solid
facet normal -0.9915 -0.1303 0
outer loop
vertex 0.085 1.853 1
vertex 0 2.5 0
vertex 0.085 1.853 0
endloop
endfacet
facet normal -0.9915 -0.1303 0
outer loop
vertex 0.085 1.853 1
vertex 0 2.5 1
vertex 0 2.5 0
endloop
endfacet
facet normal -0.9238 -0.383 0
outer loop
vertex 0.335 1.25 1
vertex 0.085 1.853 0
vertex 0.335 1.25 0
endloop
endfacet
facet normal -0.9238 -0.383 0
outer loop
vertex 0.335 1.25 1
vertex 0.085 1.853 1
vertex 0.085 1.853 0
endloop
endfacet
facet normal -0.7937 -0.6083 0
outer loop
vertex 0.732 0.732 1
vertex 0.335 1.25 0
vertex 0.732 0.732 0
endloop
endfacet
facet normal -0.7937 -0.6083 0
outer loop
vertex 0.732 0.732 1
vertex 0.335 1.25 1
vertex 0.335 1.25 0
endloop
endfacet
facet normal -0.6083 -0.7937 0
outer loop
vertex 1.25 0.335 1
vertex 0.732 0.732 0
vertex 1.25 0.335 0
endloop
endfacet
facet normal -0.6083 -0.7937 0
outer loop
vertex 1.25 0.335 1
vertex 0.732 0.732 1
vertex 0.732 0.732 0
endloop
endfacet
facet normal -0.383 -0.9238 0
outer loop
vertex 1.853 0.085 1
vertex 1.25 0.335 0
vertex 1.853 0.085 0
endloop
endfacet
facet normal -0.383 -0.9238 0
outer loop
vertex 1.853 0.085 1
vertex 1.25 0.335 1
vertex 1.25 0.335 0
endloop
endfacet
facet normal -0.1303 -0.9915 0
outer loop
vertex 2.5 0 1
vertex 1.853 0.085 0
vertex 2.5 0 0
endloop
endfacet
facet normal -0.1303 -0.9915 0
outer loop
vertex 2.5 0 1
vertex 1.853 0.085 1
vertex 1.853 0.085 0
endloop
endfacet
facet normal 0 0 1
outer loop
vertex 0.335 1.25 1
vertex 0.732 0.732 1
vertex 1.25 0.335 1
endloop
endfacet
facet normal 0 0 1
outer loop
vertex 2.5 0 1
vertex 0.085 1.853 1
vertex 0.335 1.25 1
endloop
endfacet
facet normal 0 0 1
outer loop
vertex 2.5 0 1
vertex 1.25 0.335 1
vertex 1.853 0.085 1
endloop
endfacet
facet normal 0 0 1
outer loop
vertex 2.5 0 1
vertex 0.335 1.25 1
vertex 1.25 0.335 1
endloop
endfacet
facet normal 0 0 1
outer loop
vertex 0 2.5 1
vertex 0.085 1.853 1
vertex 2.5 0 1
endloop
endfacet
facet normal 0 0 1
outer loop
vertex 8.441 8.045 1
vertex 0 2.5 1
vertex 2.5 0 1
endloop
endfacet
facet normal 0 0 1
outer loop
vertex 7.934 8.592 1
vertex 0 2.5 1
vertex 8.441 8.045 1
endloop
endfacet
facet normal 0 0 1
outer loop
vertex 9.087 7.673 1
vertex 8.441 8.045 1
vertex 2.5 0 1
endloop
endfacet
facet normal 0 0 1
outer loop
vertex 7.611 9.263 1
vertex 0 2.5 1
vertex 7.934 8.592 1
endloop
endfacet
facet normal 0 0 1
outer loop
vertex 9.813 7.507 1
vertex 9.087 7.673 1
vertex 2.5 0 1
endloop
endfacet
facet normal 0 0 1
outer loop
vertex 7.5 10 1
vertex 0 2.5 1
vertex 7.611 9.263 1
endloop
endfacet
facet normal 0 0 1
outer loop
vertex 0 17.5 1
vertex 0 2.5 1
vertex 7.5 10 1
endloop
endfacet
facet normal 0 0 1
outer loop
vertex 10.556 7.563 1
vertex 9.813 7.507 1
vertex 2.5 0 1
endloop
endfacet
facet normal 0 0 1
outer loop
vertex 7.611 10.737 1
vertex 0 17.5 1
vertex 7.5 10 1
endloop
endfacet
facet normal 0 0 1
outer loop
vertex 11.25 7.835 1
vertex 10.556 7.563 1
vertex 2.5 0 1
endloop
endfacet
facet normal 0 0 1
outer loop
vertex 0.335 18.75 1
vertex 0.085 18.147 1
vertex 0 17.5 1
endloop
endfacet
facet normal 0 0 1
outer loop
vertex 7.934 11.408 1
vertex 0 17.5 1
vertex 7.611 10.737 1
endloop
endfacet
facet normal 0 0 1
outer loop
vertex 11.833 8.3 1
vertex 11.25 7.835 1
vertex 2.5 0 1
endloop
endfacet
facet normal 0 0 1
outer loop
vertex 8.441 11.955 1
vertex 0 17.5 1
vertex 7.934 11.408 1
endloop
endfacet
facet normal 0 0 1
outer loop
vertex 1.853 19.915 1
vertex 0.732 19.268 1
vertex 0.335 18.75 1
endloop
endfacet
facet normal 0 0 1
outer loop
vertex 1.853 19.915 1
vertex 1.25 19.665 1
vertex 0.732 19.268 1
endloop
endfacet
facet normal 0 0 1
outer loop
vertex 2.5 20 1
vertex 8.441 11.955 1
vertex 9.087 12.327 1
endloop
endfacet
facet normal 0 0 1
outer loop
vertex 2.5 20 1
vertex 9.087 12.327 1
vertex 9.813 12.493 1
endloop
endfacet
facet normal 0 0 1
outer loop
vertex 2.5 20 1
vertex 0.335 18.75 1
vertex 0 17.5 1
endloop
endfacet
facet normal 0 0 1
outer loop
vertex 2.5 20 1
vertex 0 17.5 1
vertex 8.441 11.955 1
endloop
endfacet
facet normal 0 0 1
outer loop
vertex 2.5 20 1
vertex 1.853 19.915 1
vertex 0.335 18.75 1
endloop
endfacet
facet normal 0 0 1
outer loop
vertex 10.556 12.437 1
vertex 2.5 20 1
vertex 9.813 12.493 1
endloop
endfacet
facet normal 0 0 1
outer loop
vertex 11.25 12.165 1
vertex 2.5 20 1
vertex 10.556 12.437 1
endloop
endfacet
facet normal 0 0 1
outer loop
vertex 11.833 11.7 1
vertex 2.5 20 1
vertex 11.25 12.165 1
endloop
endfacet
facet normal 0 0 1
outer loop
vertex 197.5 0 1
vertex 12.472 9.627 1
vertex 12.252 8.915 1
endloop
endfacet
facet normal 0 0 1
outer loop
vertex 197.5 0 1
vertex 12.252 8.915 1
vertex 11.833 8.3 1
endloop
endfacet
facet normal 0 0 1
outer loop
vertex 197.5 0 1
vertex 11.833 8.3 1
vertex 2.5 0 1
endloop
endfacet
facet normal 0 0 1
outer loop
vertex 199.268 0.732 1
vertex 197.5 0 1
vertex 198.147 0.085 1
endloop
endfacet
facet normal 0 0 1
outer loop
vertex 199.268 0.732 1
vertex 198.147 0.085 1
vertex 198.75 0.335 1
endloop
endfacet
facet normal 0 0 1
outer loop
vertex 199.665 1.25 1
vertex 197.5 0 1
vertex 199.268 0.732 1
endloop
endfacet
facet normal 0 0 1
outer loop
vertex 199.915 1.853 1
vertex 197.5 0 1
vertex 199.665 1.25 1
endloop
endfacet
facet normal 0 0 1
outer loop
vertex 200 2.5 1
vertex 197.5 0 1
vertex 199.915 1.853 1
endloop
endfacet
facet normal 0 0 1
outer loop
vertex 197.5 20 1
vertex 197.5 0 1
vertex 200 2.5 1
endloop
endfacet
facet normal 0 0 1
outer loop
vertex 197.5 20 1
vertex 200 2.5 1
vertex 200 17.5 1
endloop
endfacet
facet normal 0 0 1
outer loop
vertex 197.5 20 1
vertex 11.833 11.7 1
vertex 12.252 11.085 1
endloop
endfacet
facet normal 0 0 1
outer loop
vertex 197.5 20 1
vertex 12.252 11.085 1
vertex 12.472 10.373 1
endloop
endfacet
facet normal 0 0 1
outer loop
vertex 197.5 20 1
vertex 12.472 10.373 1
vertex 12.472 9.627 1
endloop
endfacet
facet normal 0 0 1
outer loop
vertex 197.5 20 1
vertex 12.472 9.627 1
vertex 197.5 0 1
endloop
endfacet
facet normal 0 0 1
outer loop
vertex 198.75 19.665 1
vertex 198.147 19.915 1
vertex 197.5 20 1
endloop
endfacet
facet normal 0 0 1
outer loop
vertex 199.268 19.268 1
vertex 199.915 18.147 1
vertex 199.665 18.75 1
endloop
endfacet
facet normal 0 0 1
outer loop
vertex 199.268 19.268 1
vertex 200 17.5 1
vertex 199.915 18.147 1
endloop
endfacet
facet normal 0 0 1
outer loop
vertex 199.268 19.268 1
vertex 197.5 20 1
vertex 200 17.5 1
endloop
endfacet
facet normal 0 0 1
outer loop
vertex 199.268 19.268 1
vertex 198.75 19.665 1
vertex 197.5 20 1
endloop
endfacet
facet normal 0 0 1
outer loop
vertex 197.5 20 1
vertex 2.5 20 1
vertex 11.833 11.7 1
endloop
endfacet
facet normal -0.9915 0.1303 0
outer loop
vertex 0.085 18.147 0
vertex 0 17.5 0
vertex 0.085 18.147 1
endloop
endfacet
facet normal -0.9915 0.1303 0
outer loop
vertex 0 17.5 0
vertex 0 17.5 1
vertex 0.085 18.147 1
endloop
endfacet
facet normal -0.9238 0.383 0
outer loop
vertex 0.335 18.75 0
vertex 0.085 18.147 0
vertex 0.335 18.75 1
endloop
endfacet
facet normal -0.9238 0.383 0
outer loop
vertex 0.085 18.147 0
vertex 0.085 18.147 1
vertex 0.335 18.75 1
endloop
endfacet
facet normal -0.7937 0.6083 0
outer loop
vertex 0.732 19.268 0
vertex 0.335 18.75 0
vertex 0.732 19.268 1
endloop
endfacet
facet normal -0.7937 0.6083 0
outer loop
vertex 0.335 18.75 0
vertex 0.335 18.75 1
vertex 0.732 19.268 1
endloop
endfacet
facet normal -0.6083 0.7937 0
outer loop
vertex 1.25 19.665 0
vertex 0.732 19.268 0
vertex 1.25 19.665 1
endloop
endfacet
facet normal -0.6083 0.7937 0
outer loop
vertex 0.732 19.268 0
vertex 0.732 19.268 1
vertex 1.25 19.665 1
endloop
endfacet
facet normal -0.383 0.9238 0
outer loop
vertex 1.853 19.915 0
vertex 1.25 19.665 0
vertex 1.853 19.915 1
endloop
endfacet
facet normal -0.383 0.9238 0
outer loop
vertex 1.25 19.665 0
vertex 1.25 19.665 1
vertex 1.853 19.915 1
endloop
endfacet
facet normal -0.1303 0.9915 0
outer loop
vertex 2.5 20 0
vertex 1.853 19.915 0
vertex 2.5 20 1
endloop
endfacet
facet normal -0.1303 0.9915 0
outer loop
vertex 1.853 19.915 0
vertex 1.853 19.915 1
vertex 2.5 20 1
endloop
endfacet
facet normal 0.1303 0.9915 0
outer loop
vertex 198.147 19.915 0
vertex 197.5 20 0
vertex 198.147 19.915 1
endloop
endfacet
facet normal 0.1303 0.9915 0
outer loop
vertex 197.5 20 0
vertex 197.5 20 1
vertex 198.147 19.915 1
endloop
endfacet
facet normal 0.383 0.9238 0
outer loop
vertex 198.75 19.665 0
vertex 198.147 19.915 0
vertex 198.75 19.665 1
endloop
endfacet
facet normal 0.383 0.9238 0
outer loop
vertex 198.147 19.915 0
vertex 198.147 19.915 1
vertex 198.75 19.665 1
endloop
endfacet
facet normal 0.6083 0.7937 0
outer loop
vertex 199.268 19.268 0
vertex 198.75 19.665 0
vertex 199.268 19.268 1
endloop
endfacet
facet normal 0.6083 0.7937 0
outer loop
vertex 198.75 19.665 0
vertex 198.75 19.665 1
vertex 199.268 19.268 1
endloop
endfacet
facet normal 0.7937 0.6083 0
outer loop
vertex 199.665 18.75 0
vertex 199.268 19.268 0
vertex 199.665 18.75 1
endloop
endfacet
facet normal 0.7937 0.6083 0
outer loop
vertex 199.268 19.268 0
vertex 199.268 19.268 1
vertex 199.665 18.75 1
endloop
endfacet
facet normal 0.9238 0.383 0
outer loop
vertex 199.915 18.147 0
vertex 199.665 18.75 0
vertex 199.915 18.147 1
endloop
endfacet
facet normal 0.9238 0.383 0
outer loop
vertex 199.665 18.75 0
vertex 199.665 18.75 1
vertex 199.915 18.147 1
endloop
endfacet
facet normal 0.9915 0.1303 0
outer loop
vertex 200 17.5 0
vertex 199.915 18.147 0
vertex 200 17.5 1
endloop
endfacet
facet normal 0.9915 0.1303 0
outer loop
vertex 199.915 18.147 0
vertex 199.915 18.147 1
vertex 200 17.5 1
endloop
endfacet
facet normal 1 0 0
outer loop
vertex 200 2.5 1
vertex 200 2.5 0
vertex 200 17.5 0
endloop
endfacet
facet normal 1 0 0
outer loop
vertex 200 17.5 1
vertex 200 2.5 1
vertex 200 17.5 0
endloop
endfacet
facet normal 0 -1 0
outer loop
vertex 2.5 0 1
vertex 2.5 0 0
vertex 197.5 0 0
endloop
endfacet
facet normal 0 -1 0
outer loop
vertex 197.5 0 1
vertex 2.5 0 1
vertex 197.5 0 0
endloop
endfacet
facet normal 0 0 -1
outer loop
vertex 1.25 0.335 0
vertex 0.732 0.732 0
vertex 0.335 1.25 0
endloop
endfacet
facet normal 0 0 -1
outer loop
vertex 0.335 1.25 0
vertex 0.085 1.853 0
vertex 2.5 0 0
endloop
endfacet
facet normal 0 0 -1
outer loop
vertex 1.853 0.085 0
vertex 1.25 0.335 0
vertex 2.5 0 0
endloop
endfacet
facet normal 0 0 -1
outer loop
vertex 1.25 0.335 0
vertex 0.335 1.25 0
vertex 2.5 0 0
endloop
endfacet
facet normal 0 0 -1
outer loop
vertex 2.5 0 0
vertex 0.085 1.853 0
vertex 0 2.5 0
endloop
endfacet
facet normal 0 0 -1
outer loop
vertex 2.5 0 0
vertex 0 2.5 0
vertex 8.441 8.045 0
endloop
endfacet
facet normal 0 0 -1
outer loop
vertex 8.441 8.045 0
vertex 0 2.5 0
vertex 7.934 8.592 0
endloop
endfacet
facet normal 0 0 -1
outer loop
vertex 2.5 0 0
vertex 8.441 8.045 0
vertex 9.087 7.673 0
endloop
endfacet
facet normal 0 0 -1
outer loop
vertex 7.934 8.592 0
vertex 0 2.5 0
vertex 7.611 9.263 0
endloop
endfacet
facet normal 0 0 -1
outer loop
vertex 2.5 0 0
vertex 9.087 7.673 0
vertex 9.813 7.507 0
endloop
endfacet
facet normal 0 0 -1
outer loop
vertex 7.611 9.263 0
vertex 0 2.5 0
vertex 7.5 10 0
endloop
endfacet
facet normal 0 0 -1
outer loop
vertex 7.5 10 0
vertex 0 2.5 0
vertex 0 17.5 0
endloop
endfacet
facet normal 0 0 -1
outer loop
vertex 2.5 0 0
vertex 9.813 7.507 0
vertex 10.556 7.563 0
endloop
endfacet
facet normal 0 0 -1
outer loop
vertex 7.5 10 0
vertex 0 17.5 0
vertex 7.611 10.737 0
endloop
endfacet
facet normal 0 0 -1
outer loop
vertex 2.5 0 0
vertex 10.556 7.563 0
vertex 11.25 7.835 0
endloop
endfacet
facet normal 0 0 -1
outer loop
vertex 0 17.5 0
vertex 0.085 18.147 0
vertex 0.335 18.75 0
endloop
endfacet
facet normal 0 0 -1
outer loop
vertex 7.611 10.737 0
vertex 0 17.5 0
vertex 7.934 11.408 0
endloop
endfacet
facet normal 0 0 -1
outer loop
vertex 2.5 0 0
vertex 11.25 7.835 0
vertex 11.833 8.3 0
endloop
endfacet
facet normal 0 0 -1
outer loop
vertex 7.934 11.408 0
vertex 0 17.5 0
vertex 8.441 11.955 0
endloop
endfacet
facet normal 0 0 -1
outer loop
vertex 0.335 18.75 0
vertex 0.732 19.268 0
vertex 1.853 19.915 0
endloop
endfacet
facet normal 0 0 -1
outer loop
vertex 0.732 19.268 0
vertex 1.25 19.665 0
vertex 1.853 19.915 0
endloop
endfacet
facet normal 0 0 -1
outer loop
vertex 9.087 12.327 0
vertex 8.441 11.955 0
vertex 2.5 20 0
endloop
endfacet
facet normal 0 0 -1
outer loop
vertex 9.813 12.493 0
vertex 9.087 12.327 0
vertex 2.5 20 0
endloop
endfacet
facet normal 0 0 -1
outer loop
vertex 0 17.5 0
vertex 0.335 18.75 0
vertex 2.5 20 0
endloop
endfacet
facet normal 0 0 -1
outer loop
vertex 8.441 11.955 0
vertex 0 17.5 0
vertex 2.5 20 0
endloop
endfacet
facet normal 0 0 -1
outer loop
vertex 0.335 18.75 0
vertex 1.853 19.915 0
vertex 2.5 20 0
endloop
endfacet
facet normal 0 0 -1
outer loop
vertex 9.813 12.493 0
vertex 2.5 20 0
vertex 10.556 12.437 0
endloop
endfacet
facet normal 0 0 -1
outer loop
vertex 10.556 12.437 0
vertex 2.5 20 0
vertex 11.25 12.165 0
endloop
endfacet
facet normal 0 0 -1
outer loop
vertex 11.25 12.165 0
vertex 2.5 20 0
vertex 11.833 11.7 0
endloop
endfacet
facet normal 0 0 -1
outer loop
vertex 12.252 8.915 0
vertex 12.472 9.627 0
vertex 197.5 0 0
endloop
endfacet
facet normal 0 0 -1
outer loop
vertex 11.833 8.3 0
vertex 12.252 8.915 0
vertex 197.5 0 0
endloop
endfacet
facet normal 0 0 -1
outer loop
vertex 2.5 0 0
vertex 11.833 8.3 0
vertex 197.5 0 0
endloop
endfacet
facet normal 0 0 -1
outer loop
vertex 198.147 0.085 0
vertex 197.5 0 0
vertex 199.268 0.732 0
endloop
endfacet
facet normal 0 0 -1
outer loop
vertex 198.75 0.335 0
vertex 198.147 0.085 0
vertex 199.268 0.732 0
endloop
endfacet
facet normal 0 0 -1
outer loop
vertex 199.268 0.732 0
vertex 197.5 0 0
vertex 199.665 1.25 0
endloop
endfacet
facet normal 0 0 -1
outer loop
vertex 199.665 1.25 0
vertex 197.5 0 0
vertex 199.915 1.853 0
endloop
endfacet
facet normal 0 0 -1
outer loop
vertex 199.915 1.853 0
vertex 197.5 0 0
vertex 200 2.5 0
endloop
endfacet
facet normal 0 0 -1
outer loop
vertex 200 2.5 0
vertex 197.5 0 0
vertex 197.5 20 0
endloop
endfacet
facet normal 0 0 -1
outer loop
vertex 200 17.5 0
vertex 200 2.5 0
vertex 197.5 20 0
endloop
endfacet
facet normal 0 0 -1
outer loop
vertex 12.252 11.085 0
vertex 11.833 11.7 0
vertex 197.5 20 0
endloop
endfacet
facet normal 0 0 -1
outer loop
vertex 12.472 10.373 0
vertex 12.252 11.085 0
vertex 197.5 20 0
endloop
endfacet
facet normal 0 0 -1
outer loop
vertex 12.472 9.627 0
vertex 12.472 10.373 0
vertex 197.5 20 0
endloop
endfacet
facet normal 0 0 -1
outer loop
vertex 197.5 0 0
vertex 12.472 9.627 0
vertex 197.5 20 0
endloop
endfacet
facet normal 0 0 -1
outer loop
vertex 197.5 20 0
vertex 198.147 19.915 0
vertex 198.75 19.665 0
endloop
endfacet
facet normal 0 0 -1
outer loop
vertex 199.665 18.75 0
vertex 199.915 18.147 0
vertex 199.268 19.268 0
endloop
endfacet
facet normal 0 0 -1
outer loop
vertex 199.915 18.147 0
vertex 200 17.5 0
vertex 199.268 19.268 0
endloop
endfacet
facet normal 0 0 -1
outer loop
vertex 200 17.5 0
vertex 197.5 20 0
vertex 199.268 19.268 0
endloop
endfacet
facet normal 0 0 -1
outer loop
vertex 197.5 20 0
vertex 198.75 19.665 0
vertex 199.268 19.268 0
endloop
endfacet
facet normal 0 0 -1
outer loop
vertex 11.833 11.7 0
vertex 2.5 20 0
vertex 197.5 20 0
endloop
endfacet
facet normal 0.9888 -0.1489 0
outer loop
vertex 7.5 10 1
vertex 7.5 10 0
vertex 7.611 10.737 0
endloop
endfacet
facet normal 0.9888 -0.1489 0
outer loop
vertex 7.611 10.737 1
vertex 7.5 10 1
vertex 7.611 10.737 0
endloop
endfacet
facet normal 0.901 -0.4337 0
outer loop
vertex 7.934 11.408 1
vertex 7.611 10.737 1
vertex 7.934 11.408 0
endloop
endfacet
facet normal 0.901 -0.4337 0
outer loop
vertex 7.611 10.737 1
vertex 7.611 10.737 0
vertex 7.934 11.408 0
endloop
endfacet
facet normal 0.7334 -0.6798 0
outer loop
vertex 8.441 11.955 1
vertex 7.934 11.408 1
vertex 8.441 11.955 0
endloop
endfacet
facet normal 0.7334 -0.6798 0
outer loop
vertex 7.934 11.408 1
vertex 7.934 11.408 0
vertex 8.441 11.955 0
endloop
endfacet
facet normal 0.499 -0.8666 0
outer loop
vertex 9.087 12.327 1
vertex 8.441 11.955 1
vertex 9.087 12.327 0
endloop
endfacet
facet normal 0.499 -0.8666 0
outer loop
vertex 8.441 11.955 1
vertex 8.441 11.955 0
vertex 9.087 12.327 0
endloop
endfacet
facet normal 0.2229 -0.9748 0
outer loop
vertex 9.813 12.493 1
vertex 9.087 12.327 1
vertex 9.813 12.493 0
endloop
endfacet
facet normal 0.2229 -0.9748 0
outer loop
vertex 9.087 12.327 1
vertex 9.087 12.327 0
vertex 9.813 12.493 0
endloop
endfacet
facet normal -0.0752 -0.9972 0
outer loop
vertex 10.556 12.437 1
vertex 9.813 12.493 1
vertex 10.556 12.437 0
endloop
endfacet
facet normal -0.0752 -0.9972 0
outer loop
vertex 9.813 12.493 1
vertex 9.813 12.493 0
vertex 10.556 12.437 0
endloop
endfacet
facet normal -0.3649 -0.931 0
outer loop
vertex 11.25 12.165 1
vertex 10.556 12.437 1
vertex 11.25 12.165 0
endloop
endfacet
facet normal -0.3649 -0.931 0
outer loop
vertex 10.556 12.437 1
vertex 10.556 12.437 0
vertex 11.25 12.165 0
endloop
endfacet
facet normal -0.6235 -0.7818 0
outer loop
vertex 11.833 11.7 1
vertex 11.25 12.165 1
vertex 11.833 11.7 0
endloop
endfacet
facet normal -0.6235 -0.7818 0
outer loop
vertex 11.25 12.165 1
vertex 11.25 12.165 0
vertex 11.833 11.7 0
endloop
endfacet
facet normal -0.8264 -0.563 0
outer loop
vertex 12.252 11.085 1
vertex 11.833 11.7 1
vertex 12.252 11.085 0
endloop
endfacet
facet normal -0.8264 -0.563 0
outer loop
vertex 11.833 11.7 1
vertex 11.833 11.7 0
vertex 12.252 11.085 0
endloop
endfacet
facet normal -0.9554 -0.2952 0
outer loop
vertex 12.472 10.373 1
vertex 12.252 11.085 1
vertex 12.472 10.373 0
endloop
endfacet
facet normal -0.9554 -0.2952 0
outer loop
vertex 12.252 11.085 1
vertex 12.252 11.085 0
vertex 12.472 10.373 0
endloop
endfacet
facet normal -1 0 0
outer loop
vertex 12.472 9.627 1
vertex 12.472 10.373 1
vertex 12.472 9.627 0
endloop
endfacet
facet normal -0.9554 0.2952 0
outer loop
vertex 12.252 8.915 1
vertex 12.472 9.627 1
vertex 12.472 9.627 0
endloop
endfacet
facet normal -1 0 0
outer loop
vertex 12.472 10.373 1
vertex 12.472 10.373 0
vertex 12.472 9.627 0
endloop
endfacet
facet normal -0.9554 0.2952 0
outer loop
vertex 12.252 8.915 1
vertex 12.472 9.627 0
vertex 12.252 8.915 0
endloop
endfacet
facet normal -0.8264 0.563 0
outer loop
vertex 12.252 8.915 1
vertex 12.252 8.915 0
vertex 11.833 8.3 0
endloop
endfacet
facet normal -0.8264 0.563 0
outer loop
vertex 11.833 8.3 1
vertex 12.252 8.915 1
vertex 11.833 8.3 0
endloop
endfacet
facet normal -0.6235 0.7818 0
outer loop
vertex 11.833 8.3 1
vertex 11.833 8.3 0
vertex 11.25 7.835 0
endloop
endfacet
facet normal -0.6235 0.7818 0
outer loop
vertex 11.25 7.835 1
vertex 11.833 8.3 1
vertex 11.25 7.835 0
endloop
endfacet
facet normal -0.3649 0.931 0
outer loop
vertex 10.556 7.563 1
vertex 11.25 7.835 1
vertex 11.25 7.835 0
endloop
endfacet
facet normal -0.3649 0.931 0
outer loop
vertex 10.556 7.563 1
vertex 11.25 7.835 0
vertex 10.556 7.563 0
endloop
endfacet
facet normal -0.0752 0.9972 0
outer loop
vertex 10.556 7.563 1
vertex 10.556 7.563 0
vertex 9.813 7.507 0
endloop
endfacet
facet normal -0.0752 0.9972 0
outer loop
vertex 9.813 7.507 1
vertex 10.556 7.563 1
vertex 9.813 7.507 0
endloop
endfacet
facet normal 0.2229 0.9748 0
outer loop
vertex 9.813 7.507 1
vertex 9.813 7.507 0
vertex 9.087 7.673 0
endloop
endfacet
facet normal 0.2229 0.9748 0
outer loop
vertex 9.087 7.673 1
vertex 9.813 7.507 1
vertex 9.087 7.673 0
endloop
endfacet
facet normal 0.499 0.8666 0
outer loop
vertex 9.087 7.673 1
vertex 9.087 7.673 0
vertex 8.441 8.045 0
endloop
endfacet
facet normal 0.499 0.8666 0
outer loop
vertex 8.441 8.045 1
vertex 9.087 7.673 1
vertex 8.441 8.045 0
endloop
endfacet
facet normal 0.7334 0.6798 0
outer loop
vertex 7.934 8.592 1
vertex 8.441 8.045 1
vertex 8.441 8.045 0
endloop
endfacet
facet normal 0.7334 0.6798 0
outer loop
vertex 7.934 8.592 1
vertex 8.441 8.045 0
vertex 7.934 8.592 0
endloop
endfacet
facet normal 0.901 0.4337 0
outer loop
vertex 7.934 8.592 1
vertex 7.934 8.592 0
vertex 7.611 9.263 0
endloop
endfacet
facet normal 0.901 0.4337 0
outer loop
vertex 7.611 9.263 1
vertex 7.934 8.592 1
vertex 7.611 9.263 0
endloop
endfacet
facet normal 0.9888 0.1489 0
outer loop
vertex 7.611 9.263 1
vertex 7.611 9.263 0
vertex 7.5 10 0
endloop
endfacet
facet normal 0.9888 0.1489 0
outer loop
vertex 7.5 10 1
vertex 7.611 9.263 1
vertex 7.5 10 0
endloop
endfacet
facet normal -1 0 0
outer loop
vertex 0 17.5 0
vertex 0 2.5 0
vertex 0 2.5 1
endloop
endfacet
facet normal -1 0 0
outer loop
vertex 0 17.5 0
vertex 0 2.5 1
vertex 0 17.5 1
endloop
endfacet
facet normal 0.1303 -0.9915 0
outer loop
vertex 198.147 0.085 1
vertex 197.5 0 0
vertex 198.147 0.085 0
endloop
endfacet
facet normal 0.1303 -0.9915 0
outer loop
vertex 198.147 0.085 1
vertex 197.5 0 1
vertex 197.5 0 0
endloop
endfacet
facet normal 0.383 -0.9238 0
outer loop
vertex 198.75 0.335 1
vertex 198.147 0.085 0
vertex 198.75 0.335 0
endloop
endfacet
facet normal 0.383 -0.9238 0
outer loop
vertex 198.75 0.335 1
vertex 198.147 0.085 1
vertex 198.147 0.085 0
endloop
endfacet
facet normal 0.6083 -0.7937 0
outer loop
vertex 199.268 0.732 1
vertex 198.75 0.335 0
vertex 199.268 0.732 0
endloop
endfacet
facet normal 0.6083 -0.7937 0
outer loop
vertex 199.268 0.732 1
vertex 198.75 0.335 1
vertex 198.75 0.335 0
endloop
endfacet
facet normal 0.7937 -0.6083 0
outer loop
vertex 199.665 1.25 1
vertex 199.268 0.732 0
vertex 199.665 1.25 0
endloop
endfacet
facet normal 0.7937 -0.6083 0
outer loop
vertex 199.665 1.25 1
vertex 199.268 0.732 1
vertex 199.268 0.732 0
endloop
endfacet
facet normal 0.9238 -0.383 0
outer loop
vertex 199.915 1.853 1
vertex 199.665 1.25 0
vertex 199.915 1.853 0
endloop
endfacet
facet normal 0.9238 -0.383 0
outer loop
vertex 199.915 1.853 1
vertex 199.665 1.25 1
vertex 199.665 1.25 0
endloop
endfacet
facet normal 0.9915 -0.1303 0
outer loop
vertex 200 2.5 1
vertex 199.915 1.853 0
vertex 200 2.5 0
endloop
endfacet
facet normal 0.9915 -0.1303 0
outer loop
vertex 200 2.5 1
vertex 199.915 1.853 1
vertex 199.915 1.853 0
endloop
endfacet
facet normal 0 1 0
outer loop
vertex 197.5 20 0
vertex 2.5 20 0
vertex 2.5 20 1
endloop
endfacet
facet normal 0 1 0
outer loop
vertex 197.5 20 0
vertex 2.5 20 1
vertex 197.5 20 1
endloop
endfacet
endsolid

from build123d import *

# Parameters (mm, degrees)
F0_W     = 200
F0_H     = 20
F1_DEPTH = 1
F3_D     = 5
F4_R     = 2.5


with BuildPart() as f1:
    # F0 (on Top) → F1 (new body)
    with BuildSketch(Plane.XY):
        with Locations((100, 10)):
            Rectangle(F0_W, F0_H)
    extrude(amount=F1_DEPTH)

    # F3 (through all)
    with Locations(Plane.XY.offset(1)):
        with Locations((10, 10)):
            Hole(F3_D / 2)

    # F4
    f4_edges = [f1.edges().sort_by_distance(p)[0] for p in [
        (0, 20, 0.5),
        (0, 0, 0.5),
        (200, 0, 0.5),
        (200, 20, 0.5),
    ]]
    fillet(f4_edges, radius=F4_R)


solid = f1.part
